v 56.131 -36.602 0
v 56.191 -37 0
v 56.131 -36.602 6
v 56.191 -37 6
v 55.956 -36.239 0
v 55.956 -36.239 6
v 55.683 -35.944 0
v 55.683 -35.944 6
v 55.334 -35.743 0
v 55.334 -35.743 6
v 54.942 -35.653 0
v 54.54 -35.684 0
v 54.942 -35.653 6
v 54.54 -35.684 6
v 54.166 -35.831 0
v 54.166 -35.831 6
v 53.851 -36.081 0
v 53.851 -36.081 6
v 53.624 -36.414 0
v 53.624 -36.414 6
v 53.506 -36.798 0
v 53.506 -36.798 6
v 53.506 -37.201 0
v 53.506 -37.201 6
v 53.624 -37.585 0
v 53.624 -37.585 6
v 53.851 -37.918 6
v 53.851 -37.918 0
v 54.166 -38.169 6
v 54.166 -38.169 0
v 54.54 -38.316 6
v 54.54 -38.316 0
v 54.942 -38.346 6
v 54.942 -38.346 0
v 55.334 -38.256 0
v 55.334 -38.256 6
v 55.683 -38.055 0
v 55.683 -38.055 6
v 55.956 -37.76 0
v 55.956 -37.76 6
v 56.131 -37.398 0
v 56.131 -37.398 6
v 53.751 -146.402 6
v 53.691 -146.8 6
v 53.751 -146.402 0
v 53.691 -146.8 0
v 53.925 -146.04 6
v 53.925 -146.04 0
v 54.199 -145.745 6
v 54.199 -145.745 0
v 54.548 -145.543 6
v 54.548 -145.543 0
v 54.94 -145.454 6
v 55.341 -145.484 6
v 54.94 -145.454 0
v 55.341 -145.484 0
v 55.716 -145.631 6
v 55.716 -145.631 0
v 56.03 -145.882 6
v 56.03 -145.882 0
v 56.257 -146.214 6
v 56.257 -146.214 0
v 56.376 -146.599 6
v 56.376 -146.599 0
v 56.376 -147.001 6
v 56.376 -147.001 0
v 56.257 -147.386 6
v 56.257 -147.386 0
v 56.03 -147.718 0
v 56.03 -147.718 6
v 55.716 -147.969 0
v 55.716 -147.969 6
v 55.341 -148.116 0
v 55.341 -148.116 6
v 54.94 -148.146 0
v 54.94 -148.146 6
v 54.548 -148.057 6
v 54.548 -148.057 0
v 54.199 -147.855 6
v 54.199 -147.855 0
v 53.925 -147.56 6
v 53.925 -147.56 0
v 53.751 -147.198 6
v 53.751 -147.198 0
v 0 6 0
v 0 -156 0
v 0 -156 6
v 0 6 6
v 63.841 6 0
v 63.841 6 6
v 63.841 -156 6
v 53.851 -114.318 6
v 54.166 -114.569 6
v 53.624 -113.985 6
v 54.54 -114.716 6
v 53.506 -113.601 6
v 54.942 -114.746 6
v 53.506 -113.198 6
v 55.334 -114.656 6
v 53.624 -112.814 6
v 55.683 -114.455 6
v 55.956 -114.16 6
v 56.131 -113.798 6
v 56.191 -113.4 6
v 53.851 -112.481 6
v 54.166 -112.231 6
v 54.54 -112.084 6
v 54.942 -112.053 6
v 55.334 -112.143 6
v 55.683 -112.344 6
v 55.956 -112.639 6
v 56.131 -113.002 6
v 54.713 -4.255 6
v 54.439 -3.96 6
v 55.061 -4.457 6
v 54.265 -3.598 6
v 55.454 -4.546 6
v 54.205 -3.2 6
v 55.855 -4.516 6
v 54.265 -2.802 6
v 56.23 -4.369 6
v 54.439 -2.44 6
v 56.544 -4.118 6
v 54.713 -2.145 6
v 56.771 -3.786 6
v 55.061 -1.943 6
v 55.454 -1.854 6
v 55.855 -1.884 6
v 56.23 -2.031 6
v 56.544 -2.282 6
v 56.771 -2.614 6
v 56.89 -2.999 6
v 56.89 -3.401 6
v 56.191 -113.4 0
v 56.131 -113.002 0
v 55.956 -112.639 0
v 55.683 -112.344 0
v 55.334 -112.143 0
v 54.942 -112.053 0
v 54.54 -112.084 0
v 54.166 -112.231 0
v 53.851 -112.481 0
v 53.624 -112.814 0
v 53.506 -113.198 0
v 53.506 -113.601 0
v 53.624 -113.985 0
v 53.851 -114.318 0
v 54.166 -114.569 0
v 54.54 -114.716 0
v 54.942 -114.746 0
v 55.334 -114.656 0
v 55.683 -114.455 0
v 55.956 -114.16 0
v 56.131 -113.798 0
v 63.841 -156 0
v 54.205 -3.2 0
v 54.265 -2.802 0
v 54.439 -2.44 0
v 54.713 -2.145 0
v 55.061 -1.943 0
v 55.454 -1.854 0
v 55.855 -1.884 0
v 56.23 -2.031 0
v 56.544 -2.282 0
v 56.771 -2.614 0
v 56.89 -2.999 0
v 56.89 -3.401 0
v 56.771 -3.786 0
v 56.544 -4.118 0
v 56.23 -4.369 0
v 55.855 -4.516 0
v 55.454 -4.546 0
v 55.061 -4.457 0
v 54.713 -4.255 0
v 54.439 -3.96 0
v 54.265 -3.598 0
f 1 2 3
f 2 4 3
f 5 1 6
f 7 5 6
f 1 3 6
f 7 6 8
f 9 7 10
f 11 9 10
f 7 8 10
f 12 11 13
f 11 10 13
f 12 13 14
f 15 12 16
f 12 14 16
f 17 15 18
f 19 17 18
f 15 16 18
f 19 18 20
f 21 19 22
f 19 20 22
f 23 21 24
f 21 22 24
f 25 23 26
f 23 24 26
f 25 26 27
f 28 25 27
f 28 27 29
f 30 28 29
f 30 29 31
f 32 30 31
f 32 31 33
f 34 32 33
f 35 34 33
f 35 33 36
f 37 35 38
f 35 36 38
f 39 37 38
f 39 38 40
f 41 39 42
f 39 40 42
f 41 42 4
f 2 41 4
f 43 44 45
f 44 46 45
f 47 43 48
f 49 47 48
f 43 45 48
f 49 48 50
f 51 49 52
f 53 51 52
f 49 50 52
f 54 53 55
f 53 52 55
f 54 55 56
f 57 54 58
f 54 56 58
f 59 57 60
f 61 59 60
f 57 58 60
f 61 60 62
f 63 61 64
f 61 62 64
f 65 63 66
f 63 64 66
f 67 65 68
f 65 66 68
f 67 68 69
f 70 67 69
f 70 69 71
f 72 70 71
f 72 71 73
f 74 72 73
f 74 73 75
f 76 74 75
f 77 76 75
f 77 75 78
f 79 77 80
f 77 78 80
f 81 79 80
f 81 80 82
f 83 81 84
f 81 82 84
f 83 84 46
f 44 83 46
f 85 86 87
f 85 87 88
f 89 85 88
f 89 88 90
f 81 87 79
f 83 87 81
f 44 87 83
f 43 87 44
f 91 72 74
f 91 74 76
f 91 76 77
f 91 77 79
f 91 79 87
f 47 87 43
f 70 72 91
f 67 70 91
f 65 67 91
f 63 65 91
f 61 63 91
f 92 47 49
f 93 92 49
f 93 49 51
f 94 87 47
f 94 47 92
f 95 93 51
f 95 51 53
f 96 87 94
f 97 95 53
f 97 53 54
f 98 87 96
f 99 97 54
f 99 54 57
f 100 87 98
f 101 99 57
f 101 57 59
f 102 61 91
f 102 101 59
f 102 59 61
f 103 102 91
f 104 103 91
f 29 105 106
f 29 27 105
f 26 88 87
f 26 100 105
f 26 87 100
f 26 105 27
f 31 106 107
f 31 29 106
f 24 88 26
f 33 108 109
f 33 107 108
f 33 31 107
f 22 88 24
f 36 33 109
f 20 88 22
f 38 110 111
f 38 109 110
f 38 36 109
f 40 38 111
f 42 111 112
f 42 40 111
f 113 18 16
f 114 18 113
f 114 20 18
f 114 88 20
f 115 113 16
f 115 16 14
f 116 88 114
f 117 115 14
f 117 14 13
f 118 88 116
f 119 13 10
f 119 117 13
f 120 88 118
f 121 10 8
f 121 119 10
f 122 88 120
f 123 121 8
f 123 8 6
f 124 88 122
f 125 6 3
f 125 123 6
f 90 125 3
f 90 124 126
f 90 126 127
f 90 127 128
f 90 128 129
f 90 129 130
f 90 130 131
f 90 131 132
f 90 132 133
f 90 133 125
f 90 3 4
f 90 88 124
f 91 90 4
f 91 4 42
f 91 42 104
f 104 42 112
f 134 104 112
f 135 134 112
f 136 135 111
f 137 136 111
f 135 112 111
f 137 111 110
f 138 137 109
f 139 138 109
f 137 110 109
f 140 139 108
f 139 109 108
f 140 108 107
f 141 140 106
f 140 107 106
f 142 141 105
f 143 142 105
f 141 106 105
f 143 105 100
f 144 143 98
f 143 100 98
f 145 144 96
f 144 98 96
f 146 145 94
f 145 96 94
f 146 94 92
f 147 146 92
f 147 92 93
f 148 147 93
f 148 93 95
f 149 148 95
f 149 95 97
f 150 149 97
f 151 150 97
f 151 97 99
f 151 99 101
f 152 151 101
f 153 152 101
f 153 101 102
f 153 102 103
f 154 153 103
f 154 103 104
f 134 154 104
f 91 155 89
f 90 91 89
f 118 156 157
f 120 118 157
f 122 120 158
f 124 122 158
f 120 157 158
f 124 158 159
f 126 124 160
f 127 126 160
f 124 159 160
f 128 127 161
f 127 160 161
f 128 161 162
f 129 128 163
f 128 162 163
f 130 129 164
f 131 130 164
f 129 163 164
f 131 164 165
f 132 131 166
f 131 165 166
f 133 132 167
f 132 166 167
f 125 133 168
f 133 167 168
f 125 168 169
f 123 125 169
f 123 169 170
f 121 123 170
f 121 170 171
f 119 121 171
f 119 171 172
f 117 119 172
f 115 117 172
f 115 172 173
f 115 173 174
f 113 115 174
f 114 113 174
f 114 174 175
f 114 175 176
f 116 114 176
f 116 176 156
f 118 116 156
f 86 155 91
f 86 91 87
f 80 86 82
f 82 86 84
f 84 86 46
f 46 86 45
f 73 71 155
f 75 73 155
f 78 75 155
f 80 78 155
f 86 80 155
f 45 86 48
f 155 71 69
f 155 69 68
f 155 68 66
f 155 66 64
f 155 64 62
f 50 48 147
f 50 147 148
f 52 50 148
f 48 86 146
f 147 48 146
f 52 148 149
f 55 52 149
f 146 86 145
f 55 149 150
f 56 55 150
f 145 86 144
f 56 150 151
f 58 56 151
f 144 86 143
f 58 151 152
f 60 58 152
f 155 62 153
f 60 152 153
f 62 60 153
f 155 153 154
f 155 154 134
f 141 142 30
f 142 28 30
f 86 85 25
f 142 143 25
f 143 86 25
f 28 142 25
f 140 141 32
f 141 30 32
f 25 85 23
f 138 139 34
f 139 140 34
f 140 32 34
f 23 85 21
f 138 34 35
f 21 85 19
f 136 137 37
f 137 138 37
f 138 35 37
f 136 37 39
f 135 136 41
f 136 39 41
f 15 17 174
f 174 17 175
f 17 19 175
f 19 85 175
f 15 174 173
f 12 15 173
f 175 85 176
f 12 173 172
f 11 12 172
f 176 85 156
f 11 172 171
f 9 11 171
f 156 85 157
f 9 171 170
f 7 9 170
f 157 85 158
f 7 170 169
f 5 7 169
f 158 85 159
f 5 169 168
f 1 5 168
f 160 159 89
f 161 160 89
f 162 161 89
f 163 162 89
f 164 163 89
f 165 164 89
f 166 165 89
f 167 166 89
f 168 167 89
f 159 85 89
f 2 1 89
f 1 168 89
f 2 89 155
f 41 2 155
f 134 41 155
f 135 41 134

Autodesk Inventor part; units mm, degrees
ref_plane "YZ Plane" through (0, 0, 0) normal (1, 0, 0) x (0, 1, 0)
ref_plane "XZ Plane" through (0, 0, 0) normal (0, 1, 0) x (-1, 0, 0)
ref_plane "XY Plane" through (0, 0, 0) normal (0, 0, 1) x (1, 0, 0)
sketch "스케치1" plane through (0, 0, 0) normal (0, 0, 1) x (1, 0, 0)
  line L0 (0, 0) -> (63.841, 0) projected
  line L1 (63.841, 0) -> (63.841, 6) projected
  line L2 (0, 6) -> (63.841, 6) projected
  line L3 (0, 0) -> (0, 6) projected
  circle A0 centre (54.8408, -3) radius 1.45 projected
  line L4 (63.841, 0) -> (51.8408, 0) projected
  line L5 (51.8408, 0) -> (51.8408, -12) projected
  line L6 (51.8408, -12) -> (57.8409, -12) projected
  line L7 (57.8409, -12) -> (57.8409, -6) projected
  line L8 (57.8409, -6) -> (63.841, -6) projected
  line L9 (63.841, -6) -> (63.841, 0) projected
  line L10 (46.0408, 0) -> (46.0408, -150) projected
  line L11 (63.841, 6) -> (0, 6)
  line L12 (0, 6) -> (0, -150)
  line L13 (0, -150) -> (63.841, -150)
  line L14 (63.841, -150) -> (63.841, 6)
  line L15 (63.841, -75) -> (51.8408, -75)
  circle A1 centre (54.8408, -147) radius 1.45
  line L16 (63.841, -150) -> (51.8408, -150)
  line L17 (51.8408, -150) -> (51.8408, -138)
  line L18 (51.8408, -138) -> (57.8409, -138)
  line L19 (57.8409, -138) -> (57.8409, -144)
  line L20 (57.8409, -144) -> (63.841, -144)
  line L21 (63.841, -144) -> (63.841, -150)
  line L22 (1.1205, -156.4) -> (64.9491, -156.4) projected
  line L23 (64.9491, -156.4) -> (64.9491, -150.4) projected
  line L24 (1.1205, -150.4) -> (64.9491, -150.4) projected
  line L25 (1.1205, -156.4) -> (1.1205, -150.4) projected
  line L26 (63.841, -150) -> (63.841, -156)
  line L27 (0, -150) -> (0, -156)
  line L28 (63.841, -156) -> (0, -156)
  line L29 (63.841, -156) -> (0, -156)
  line L30 (0, -156) -> (0, -156.4)
  line L31 (0, -156.4) -> (63.841, -156.4)
  line L32 (63.841, -156.4) -> (63.841, -156)
  line L33 (5.8, -150) -> (5.8, 0) projected
  line L34 (46.0408, -150) -> (51.8408, -150) projected
  line L35 (51.8408, -150) -> (51.8408, 0) projected
  line L36 (51.8408, 0) -> (46.0408, 0) projected
  line L37 (0, 0) -> (0, -150) projected
  line L38 (0, -150) -> (5.8, -150) projected
  line L39 (5.8, 0) -> (0, 0) projected
  point P0 (0, -156)
  point P1 (1.1205, -156)
  point P2 (0, -156)
extrude "돌출1" add sketch "스케치1" along normal blind 6 contours L3 L2 L1 L0 | L0 L33 L13 L12 | L0 L10 L13 L33 | L13 L26 L24 L25 L28 L27 | L0 L5 L35 L17 L13 L10 | L0 L9 L8 L7 L6 L5 | L25 L24 L26 L28 | L6 L7 L8 L14 L15 L35 | L17 L18 L19 L20 L14 L13 | L15 L14 L20 L19 L18 L35 | A0 | A1
sketch "스케치2" plane through (0, 0, 6) normal (0, 0, 1) x (1, 0, 0)
  line L0 (63.841, 6) -> (0, 6) projected
  line L1 (31.9205, 6) -> (31.9205, -150)
  line L2 (0, -150) -> (63.841, -150) projected
  line L3 (63.841, -150) -> (63.841, 6) projected
  line L4 (63.841, -72) -> (0, -72)
  line L5 (0, 6) -> (0, -156) projected
  line L6 (31.9205, -72) -> (0, -72)
  line L7 (63.841, -72) -> (31.9205, -72)
  line L8 (47.8807, -72) -> (15.9603, -72)
  line L9 (47.8807, -52) -> (70.452, -52) construction
  line L10 (0, -72) -> (15.9603, -72)
  line L11 (55.9312, -52.0469) -> (55.8609, -92)
  line L12 (31.9205, -72) -> (47.8807, -72)
  line L13 (47.909, -97.3012) -> (7.9801, -72)
  line L14 (47.909, -46.6988) -> (7.9801, -72)
  line L15 (47.909, -97.3012) -> (55.8609, -92)
  line L16 (55.9312, -52.0469) -> (47.909, -46.6988)
  line L17 (49.5449, -99.8162) -> (58.858, -93.6074)
  line L18 (58.858, -93.6074) -> (58.9341, -50.4432)
  line L19 (58.9341, -50.4432) -> (49.5449, -44.1838)
  line L20 (46.2731, -99.8162) -> (2.3752, -72)
  line L21 (2.3752, -72) -> (46.2731, -44.1838)
  line L22 (46.2731, -44.1838) -> (49.5449, -44.1838)
  line L23 (49.5449, -99.8162) -> (46.2731, -99.8162)
  line L24 (55.8715, -85.95) -> (51.8815, -83.2899)
  line L25 (51.8815, -83.2899) -> (51.9201, -49.3728)
  line L26 (55.8609, -92) -> (47.8807, -92)
  line L27 (51.9201, -49.3728) -> (43.6889, -49.3728)
  line L28 (43.6889, -49.3728) -> (43.6889, -94.6272)
  line L29 (39.5429, -52) -> (43.6889, -52)
  line L30 (43.6889, -52) -> (43.6889, -92)
  line L31 (43.6889, -92) -> (39.5429, -92)
  line L32 (39.5429, -92) -> (39.5429, -52)
  line L33 (49.5449, -49.3728) -> (49.5449, -92)
  line L34 (47.8045, -49.3728) -> (43.6889, -49.3728)
  line L35 (45.7467, -49.3728) -> (45.7467, -95.9311)
  line L36 (43.6889, -52) -> (49.5449, -52)
  line L37 (39.5429, -92) -> (43.6889, -92)
  line L38 (43.6889, -92) -> (43.6889, -52)
  line L39 (43.6889, -52) -> (39.5429, -52)
  line L40 (39.5429, -52) -> (39.5429, -92)
  line L41 (47.8807, -92) -> (43.6889, -92)
  line L42 (47.8807, -92) -> (47.8807, -49.3728)
  point P0 (0, 0)
  dimension "d4" = 3
  dimension "d5" = 3
sketch "스케치3" plane through (0, 0, 6) normal (0, 0, 1) x (1, 0, 0)
  point P0 (0, 0)
sketch "스케치4" plane through (0, 0, 6) normal (0, 0, 1) x (1, 0, 0)
  circle A0 centre (54.8408, -36.9997) radius 1.35 projected
  line L0 (51.8408, -33.9997) -> (51.8408, -39.9997) projected
  line L1 (51.8408, -39.9997) -> (102.8408, -39.9997) projected
  line L2 (102.8408, -33.9997) -> (102.8408, -39.9997) projected
  line L3 (51.8408, -33.9997) -> (102.8408, -33.9997) projected
  circle A1 centre (54.8408, -113.3997) radius 1.35 projected
  line L4 (51.8408, -110.3997) -> (51.8408, -116.3997) projected
  line L5 (51.8408, -116.3997) -> (102.8408, -116.3997) projected
  line L6 (102.8408, -116.3997) -> (102.8408, -110.3997) projected
  line L7 (51.8408, -110.3997) -> (102.8408, -110.3997) projected
  point P0 (0, 0)
extrude "돌출2" cut sketch "스케치4" against normal blind 10 contours A0 | A1
sketch "스케치6" plane through (0, 0, 0) normal (0, 0, -1) x (-1, 0, 0)
  circle A0 centre (-55.0408, -146.8) radius 1.35 projected
  line L0 (-52.0408, -149.8) -> (-52.0408, -137.8) projected
  line L1 (-52.0408, -149.8) -> (-64.0408, -149.8) projected
  line L2 (-64.0408, -149.8) -> (-64.0408, -143.8) projected
  line L3 (-58.0408, -143.8) -> (-64.0408, -143.8) projected
  line L4 (-58.0408, -143.8) -> (-58.0408, -137.8) projected
  line L5 (-52.0408, -137.8) -> (-58.0408, -137.8) projected
  circle A1 centre (-55.5547, -3.2) radius 1.35 projected
  line L6 (-52.5547, -0.2) -> (-52.5547, -12.2) projected
  line L7 (-52.5547, -12.2) -> (-58.5547, -12.2) projected
  line L8 (-58.5547, -6.2) -> (-58.5547, -12.2) projected
  line L9 (-58.5547, -6.2) -> (-64.5547, -6.2) projected
  line L10 (-64.5547, -0.2) -> (-64.5547, -6.2) projected
  line L11 (-52.5547, -0.2) -> (-64.5547, -0.2) projected
  point P0 (0, 0)
extrude "돌출4" cut sketch "스케치6" against normal up to next contours A0 | A1
properties part number "부품76" material "PMMA 플라스틱"
